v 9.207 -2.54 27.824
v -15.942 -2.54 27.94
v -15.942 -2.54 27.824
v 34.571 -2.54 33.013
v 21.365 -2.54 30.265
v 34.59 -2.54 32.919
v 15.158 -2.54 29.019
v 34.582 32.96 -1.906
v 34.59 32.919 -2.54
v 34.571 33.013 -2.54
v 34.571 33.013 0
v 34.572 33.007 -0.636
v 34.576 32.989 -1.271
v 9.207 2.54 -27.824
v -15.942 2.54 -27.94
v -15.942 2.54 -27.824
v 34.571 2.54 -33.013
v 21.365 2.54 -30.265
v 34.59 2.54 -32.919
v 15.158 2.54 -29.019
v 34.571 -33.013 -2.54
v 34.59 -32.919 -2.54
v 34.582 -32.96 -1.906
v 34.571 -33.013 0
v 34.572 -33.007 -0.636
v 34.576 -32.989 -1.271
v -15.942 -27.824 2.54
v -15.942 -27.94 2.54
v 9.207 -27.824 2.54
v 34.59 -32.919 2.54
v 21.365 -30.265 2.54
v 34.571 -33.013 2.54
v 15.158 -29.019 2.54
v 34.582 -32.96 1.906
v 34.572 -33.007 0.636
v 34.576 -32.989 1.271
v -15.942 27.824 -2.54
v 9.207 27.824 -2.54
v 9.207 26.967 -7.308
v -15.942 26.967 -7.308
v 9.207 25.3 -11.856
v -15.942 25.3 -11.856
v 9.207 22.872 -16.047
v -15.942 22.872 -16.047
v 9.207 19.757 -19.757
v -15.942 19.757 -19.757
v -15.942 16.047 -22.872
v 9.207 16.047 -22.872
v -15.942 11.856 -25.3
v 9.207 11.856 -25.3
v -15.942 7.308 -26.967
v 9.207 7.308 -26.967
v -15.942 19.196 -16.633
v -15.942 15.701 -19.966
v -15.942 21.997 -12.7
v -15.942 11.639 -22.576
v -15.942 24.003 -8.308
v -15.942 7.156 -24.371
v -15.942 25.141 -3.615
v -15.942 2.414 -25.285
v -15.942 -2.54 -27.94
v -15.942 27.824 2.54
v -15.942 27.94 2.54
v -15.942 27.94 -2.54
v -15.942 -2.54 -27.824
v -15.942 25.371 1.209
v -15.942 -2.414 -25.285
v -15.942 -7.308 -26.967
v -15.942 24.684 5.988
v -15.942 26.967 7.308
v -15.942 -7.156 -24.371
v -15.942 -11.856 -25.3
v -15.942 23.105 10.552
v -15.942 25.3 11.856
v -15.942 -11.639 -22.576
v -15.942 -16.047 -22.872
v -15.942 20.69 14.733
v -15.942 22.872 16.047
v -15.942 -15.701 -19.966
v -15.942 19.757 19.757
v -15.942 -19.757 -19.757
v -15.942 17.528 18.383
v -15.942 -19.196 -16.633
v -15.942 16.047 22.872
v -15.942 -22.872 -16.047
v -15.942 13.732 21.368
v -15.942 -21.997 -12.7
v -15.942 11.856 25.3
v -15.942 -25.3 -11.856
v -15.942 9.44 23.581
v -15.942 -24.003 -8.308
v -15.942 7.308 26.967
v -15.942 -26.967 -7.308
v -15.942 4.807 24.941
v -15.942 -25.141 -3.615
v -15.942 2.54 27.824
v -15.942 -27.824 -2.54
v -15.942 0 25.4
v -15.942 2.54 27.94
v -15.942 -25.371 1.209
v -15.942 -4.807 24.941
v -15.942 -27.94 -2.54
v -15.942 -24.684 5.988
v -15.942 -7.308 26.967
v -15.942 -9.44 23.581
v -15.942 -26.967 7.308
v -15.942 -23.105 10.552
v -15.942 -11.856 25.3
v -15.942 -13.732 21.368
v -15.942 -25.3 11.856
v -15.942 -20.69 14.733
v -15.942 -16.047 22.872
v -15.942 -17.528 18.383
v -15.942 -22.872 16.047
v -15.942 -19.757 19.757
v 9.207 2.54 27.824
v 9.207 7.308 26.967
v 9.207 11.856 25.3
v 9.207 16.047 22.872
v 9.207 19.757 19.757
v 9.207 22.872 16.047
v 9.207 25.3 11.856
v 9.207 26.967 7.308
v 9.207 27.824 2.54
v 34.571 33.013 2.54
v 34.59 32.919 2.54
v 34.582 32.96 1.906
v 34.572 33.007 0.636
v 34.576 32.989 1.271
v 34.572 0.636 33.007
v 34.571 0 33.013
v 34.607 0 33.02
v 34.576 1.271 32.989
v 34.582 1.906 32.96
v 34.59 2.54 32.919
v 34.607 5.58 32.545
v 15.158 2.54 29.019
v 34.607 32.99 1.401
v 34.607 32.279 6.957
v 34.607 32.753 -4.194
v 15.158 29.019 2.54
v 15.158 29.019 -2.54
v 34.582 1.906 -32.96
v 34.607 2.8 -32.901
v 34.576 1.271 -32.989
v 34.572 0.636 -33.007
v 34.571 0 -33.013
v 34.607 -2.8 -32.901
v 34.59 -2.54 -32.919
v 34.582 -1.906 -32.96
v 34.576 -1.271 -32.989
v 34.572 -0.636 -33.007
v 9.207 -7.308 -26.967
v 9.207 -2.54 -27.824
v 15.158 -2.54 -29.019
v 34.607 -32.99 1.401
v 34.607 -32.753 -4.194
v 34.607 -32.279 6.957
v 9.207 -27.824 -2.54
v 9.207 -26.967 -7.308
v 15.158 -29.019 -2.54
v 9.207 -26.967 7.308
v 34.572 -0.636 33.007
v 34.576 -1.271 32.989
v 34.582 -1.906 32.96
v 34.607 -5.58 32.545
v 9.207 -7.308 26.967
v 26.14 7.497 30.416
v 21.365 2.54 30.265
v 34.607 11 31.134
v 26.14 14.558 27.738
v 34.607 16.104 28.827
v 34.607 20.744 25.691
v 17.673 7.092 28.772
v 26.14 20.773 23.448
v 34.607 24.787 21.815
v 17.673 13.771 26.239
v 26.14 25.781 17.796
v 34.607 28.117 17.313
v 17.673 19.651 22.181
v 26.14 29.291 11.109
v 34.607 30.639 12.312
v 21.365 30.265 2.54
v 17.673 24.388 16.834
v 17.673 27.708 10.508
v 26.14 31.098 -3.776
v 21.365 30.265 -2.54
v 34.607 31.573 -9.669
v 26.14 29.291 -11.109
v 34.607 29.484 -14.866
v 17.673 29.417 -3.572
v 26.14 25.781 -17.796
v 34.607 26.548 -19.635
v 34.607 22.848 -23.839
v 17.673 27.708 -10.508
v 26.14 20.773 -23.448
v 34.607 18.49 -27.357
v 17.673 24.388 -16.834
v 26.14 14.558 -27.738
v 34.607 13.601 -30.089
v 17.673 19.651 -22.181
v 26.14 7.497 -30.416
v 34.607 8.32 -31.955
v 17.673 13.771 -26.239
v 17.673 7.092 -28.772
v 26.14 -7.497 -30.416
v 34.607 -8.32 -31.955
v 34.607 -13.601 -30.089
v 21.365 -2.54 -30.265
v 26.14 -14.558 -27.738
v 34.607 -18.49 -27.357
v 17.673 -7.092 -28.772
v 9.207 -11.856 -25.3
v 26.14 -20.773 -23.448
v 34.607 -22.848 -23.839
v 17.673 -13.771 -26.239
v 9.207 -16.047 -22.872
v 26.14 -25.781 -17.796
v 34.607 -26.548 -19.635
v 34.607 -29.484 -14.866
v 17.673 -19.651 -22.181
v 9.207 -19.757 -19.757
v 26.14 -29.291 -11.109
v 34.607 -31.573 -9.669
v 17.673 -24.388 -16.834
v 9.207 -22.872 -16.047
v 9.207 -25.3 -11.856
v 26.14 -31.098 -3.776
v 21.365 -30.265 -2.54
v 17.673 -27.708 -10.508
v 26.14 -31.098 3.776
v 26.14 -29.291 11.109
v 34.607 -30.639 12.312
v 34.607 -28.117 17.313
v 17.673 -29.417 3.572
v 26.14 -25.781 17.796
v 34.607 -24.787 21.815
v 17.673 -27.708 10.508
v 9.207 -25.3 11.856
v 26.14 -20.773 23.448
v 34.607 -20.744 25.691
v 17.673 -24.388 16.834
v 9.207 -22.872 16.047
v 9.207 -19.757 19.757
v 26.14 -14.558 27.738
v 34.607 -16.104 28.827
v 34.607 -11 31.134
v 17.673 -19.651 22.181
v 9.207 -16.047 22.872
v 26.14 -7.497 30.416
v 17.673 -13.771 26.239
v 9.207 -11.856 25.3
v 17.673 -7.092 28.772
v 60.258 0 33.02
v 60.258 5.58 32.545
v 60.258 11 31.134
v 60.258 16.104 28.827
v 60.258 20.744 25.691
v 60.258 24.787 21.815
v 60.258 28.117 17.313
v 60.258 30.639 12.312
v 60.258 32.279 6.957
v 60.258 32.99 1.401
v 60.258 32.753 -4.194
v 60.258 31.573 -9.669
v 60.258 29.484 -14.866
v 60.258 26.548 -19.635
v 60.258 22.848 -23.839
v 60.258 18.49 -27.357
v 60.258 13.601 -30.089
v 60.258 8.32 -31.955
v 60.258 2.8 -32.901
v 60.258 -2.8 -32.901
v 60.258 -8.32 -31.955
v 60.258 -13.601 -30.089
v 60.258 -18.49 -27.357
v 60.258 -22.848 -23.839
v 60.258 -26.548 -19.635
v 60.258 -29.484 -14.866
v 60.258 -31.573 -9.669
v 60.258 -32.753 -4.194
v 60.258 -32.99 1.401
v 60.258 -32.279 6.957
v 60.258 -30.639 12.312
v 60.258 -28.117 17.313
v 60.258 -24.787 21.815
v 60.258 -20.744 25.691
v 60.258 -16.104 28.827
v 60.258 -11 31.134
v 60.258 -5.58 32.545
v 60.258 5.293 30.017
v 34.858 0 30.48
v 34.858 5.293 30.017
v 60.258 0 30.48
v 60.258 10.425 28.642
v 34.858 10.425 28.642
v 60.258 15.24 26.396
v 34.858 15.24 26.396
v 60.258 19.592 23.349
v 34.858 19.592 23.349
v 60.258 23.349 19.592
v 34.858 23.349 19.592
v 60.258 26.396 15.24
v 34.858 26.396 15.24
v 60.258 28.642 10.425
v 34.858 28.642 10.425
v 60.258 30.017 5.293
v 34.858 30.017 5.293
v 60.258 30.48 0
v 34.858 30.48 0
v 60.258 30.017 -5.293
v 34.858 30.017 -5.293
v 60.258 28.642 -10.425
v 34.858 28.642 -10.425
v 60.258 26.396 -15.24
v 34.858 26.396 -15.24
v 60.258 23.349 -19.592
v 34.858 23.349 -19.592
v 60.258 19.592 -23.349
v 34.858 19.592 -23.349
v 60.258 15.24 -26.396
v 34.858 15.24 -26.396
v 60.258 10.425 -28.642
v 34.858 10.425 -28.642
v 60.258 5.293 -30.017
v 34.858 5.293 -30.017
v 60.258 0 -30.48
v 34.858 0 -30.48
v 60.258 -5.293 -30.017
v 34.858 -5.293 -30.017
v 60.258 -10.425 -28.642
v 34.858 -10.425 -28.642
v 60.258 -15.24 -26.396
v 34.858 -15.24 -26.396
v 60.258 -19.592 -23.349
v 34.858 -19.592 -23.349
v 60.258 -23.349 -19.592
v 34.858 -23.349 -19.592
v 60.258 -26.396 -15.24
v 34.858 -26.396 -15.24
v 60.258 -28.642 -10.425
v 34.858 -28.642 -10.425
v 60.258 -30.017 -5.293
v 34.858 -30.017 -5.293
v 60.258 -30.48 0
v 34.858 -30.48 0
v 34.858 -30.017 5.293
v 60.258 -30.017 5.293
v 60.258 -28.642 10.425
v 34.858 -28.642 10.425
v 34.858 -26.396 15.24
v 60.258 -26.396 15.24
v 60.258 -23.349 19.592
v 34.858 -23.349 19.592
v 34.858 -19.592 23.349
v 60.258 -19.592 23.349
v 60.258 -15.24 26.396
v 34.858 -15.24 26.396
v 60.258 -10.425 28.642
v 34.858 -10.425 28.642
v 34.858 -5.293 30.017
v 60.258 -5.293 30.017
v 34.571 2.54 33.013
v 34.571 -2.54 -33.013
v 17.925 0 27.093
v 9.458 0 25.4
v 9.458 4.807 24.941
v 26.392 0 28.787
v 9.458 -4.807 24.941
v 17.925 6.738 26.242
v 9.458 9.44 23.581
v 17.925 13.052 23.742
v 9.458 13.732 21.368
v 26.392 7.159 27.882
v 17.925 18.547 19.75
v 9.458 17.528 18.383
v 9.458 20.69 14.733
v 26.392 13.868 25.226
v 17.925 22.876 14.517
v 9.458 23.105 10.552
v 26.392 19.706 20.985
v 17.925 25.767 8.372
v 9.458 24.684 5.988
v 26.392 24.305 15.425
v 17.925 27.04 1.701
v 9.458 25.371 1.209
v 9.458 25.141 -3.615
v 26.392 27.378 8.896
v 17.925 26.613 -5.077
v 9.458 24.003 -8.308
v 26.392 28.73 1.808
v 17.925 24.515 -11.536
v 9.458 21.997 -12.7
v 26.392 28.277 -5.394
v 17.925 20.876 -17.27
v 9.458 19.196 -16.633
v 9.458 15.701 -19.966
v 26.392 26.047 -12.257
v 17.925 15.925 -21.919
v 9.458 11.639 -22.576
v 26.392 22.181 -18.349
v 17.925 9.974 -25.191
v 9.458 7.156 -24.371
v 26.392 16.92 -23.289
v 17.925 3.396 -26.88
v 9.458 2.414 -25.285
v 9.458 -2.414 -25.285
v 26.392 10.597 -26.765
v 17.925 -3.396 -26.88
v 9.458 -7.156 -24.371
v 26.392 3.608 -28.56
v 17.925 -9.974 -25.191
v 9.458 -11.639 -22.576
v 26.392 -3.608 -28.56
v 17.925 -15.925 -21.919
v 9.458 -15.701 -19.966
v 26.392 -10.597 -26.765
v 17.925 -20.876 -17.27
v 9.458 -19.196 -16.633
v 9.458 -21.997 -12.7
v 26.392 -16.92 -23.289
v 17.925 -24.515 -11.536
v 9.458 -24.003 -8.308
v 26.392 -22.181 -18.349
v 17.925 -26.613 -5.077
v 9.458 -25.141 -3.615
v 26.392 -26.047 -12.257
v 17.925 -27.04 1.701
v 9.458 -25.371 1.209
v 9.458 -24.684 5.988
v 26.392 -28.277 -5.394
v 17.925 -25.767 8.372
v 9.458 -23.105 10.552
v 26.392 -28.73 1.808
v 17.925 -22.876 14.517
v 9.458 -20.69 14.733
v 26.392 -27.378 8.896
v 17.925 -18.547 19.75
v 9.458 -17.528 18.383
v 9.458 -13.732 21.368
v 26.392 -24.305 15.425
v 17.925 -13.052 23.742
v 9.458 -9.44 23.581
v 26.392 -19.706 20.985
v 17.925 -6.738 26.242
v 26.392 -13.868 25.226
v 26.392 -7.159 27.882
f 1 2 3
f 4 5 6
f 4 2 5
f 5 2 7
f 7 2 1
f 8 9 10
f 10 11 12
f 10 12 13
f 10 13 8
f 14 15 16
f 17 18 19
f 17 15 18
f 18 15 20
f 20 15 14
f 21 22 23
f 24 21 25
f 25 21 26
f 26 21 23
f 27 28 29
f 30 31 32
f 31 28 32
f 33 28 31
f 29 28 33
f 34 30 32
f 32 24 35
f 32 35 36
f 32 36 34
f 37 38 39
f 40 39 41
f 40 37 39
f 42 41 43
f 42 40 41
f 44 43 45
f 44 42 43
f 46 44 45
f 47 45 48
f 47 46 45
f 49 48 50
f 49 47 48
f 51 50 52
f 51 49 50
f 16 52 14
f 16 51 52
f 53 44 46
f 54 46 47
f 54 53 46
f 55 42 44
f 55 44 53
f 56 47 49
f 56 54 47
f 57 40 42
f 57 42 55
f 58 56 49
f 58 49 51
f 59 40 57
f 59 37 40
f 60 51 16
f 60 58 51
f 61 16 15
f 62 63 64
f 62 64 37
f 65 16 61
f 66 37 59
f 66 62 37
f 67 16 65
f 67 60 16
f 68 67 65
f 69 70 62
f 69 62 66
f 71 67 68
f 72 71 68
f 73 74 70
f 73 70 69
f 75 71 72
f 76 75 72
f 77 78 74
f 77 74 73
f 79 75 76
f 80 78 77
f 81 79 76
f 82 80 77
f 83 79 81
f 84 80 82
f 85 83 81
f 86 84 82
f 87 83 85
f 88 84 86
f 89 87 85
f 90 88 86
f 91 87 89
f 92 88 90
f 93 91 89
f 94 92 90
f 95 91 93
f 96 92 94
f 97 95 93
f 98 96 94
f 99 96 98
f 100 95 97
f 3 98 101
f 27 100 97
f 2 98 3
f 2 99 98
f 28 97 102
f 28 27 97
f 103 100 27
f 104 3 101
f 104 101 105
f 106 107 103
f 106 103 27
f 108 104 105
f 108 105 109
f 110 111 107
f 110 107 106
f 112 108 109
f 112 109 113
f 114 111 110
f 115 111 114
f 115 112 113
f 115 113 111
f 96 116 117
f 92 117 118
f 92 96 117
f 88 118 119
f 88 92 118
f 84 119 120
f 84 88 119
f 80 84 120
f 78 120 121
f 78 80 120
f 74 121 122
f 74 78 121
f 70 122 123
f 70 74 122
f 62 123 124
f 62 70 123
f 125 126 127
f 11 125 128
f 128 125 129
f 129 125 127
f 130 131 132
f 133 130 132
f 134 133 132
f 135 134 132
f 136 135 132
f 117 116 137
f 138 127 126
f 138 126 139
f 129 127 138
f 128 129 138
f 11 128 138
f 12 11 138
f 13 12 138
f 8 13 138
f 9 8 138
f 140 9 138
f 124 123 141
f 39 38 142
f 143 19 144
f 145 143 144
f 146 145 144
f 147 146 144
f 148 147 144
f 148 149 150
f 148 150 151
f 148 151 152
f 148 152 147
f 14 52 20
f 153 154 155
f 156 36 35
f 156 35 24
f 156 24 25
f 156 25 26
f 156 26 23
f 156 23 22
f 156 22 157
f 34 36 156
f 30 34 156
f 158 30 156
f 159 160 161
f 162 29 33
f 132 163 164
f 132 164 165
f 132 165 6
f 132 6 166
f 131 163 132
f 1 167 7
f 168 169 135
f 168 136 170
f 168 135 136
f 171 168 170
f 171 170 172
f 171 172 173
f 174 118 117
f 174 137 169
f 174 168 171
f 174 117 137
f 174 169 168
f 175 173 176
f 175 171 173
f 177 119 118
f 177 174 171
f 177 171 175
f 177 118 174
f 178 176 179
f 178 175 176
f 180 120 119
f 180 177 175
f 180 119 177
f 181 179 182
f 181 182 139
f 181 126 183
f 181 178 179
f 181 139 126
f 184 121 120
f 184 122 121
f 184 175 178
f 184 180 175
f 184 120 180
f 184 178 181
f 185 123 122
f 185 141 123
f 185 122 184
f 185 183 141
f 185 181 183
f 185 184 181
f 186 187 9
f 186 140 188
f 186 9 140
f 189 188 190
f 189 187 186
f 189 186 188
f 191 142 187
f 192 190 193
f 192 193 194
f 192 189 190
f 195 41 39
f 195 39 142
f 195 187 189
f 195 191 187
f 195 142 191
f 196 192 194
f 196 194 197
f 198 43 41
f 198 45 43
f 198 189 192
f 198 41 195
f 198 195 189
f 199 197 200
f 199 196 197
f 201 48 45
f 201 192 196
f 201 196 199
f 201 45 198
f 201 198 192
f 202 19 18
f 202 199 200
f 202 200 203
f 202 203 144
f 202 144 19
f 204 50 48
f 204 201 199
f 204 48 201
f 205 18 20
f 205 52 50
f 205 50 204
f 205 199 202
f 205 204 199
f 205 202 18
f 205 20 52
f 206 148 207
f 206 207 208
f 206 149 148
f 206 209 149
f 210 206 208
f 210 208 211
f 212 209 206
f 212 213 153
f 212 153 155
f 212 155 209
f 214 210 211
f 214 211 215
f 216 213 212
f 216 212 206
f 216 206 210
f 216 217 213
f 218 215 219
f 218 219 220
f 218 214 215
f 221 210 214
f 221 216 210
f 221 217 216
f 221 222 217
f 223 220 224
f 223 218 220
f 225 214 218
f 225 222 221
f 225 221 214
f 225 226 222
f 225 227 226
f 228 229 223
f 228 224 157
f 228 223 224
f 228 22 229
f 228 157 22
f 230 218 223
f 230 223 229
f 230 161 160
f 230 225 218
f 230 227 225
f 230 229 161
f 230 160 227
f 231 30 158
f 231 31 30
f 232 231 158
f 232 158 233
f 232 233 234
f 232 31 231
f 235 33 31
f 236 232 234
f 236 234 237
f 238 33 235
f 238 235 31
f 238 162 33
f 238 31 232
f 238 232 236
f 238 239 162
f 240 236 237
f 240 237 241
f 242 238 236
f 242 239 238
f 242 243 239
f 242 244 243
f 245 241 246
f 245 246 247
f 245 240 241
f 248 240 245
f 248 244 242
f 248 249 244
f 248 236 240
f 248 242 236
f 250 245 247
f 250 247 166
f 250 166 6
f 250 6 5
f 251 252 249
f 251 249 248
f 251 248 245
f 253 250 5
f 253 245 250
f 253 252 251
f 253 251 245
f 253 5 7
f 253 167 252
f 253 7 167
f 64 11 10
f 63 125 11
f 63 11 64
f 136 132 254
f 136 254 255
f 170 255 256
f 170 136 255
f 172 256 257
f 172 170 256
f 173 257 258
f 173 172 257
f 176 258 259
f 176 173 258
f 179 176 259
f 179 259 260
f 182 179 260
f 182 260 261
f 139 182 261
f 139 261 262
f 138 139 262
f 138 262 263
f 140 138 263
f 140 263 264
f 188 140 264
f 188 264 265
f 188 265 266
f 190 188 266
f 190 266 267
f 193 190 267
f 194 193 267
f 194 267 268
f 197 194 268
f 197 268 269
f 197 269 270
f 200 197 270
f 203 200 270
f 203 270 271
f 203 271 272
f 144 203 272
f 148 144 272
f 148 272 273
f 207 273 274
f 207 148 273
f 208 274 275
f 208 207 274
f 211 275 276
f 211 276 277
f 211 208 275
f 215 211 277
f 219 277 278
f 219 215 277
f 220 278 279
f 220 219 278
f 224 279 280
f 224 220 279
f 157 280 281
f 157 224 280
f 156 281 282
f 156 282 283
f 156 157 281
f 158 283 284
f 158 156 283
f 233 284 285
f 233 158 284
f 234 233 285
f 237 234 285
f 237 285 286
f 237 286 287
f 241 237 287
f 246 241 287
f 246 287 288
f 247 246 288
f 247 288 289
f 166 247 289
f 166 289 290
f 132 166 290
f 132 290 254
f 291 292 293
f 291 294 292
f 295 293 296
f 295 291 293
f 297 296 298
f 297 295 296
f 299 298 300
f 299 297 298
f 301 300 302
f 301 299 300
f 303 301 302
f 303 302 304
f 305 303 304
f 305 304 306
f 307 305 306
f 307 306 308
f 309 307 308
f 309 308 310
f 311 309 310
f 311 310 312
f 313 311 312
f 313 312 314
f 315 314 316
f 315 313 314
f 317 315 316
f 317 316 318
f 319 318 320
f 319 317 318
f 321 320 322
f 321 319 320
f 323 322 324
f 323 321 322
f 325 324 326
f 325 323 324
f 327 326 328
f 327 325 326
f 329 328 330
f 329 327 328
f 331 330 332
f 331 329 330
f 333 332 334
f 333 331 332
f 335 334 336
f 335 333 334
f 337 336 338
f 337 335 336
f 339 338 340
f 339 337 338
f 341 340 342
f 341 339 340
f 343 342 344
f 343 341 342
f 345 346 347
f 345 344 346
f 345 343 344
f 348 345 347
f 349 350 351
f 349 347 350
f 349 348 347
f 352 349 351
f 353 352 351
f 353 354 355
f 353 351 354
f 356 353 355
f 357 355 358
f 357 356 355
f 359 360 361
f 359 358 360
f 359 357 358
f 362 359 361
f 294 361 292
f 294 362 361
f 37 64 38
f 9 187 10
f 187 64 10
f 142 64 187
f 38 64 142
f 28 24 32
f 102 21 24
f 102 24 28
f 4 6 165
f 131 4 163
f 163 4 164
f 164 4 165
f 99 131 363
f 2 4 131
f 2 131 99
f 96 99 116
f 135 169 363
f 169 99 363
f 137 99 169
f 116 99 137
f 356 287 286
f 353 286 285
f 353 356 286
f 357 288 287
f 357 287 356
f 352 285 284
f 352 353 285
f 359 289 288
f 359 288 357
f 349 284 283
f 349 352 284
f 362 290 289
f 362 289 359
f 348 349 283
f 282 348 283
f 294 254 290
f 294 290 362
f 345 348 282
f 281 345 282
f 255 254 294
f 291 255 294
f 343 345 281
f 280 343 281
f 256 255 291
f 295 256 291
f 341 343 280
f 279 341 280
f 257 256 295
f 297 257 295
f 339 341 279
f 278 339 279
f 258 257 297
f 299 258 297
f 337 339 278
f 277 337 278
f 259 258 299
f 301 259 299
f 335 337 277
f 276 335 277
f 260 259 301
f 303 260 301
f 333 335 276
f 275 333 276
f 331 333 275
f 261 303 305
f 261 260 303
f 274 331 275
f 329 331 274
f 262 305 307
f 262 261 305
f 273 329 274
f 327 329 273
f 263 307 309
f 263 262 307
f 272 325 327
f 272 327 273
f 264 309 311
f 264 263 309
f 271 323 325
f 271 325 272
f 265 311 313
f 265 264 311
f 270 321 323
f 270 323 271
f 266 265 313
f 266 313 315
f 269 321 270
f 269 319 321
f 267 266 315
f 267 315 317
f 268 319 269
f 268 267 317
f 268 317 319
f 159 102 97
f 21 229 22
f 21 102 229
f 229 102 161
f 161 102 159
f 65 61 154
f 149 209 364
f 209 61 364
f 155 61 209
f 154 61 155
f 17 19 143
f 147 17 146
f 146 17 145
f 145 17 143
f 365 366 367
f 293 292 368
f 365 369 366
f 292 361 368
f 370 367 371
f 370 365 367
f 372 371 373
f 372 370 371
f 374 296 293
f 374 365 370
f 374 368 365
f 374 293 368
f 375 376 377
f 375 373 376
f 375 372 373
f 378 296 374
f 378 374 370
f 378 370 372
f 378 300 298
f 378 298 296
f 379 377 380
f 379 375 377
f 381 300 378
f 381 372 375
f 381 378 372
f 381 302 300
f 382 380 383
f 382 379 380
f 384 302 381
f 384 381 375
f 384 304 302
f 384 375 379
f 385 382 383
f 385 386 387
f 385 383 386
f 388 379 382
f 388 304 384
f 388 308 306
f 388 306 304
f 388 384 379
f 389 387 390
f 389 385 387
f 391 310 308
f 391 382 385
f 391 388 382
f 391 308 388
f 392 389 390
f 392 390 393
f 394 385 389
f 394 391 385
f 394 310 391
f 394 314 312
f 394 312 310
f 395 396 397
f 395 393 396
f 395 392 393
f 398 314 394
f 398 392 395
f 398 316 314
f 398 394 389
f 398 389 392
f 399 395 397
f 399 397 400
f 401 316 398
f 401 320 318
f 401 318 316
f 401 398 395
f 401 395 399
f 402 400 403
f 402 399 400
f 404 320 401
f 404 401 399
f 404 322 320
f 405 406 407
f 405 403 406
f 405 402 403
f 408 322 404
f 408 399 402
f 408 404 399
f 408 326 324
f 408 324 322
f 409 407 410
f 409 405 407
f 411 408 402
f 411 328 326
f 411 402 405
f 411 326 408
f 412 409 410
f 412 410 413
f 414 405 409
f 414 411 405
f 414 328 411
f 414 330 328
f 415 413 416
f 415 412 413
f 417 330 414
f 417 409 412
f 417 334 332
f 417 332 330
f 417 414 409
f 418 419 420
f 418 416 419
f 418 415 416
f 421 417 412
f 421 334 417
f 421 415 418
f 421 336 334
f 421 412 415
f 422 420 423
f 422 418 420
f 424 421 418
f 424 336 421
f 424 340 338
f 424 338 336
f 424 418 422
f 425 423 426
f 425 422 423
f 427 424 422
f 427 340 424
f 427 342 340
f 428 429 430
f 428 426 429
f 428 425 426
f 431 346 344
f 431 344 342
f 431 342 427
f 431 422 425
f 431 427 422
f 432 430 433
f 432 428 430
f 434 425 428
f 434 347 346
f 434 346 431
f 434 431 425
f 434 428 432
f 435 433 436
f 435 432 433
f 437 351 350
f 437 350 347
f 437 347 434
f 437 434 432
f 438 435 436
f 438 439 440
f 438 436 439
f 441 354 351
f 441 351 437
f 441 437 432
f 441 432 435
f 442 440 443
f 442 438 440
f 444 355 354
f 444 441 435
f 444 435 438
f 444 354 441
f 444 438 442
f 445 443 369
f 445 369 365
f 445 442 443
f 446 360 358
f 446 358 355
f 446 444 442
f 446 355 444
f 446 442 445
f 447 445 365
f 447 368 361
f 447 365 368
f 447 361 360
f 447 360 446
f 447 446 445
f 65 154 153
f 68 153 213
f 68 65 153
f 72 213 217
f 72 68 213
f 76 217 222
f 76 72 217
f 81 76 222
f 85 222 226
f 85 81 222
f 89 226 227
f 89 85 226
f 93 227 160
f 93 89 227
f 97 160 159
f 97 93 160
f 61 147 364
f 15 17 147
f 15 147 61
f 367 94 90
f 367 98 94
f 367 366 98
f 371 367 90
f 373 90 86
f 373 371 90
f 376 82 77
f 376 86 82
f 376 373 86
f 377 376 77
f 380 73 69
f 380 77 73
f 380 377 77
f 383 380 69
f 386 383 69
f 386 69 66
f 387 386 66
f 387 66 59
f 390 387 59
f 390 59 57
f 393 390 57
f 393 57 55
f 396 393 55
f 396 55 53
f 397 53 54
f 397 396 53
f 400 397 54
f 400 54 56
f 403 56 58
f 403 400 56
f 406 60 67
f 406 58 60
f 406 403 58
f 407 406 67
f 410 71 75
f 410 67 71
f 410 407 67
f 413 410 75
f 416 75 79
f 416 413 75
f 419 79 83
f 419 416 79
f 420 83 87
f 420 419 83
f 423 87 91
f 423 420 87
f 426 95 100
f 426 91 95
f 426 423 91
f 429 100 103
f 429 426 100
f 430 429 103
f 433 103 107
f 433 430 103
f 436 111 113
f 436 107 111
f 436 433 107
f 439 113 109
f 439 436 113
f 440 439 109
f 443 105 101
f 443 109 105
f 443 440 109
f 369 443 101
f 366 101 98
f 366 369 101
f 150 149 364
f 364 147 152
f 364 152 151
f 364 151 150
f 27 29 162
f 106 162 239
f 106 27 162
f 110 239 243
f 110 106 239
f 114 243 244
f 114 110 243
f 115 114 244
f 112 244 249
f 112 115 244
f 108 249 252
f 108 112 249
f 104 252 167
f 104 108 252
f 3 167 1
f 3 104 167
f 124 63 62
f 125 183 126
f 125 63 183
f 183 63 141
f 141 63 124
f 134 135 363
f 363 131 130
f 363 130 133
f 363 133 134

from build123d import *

# Parameters (mm, degrees)
F3_DEPTH = 2.54
F4_COUNT = 4


with BuildPart() as f1:
    # F0 (on Front) → F1 (revolve)
    with BuildSketch(Plane.XZ):
        Polygon((-15.9417227864, 25.4), (9.4582772136, 25.4), (34.8582772136, 30.48), (60.2582772136, 30.48), (60.2582772136, 33.02), (34.606767649, 33.02), (9.206767649, 27.94), (-15.9417227864, 27.94), align=None)
    revolve(axis=Axis((9.6230469644, 0, 0), (-1, 0, 0)))

    # F2 (on Front) → F3 (join, symmetric)
    with BuildSketch(Plane.XZ):
        Polygon((-15.9417227864, 26.67), (9.3325224313, 26.67), (34.8202880916, 31.767553132), (34.5712205999, 33.0128905902), (-15.9417227864, 27.94), align=None)
    extrude(amount=F3_DEPTH, both=True)

    # F4: F1 ×4 about axis
    f4_axis = Axis((9.6230469644, 0, 0), (-1, 0, 0))


with BuildPart() as f1_1:
    add(f1.part)
    for i in range(1, F4_COUNT):
        add(f1.part.rotate(f4_axis, i * 360 / F4_COUNT))


solid = f1_1.part
